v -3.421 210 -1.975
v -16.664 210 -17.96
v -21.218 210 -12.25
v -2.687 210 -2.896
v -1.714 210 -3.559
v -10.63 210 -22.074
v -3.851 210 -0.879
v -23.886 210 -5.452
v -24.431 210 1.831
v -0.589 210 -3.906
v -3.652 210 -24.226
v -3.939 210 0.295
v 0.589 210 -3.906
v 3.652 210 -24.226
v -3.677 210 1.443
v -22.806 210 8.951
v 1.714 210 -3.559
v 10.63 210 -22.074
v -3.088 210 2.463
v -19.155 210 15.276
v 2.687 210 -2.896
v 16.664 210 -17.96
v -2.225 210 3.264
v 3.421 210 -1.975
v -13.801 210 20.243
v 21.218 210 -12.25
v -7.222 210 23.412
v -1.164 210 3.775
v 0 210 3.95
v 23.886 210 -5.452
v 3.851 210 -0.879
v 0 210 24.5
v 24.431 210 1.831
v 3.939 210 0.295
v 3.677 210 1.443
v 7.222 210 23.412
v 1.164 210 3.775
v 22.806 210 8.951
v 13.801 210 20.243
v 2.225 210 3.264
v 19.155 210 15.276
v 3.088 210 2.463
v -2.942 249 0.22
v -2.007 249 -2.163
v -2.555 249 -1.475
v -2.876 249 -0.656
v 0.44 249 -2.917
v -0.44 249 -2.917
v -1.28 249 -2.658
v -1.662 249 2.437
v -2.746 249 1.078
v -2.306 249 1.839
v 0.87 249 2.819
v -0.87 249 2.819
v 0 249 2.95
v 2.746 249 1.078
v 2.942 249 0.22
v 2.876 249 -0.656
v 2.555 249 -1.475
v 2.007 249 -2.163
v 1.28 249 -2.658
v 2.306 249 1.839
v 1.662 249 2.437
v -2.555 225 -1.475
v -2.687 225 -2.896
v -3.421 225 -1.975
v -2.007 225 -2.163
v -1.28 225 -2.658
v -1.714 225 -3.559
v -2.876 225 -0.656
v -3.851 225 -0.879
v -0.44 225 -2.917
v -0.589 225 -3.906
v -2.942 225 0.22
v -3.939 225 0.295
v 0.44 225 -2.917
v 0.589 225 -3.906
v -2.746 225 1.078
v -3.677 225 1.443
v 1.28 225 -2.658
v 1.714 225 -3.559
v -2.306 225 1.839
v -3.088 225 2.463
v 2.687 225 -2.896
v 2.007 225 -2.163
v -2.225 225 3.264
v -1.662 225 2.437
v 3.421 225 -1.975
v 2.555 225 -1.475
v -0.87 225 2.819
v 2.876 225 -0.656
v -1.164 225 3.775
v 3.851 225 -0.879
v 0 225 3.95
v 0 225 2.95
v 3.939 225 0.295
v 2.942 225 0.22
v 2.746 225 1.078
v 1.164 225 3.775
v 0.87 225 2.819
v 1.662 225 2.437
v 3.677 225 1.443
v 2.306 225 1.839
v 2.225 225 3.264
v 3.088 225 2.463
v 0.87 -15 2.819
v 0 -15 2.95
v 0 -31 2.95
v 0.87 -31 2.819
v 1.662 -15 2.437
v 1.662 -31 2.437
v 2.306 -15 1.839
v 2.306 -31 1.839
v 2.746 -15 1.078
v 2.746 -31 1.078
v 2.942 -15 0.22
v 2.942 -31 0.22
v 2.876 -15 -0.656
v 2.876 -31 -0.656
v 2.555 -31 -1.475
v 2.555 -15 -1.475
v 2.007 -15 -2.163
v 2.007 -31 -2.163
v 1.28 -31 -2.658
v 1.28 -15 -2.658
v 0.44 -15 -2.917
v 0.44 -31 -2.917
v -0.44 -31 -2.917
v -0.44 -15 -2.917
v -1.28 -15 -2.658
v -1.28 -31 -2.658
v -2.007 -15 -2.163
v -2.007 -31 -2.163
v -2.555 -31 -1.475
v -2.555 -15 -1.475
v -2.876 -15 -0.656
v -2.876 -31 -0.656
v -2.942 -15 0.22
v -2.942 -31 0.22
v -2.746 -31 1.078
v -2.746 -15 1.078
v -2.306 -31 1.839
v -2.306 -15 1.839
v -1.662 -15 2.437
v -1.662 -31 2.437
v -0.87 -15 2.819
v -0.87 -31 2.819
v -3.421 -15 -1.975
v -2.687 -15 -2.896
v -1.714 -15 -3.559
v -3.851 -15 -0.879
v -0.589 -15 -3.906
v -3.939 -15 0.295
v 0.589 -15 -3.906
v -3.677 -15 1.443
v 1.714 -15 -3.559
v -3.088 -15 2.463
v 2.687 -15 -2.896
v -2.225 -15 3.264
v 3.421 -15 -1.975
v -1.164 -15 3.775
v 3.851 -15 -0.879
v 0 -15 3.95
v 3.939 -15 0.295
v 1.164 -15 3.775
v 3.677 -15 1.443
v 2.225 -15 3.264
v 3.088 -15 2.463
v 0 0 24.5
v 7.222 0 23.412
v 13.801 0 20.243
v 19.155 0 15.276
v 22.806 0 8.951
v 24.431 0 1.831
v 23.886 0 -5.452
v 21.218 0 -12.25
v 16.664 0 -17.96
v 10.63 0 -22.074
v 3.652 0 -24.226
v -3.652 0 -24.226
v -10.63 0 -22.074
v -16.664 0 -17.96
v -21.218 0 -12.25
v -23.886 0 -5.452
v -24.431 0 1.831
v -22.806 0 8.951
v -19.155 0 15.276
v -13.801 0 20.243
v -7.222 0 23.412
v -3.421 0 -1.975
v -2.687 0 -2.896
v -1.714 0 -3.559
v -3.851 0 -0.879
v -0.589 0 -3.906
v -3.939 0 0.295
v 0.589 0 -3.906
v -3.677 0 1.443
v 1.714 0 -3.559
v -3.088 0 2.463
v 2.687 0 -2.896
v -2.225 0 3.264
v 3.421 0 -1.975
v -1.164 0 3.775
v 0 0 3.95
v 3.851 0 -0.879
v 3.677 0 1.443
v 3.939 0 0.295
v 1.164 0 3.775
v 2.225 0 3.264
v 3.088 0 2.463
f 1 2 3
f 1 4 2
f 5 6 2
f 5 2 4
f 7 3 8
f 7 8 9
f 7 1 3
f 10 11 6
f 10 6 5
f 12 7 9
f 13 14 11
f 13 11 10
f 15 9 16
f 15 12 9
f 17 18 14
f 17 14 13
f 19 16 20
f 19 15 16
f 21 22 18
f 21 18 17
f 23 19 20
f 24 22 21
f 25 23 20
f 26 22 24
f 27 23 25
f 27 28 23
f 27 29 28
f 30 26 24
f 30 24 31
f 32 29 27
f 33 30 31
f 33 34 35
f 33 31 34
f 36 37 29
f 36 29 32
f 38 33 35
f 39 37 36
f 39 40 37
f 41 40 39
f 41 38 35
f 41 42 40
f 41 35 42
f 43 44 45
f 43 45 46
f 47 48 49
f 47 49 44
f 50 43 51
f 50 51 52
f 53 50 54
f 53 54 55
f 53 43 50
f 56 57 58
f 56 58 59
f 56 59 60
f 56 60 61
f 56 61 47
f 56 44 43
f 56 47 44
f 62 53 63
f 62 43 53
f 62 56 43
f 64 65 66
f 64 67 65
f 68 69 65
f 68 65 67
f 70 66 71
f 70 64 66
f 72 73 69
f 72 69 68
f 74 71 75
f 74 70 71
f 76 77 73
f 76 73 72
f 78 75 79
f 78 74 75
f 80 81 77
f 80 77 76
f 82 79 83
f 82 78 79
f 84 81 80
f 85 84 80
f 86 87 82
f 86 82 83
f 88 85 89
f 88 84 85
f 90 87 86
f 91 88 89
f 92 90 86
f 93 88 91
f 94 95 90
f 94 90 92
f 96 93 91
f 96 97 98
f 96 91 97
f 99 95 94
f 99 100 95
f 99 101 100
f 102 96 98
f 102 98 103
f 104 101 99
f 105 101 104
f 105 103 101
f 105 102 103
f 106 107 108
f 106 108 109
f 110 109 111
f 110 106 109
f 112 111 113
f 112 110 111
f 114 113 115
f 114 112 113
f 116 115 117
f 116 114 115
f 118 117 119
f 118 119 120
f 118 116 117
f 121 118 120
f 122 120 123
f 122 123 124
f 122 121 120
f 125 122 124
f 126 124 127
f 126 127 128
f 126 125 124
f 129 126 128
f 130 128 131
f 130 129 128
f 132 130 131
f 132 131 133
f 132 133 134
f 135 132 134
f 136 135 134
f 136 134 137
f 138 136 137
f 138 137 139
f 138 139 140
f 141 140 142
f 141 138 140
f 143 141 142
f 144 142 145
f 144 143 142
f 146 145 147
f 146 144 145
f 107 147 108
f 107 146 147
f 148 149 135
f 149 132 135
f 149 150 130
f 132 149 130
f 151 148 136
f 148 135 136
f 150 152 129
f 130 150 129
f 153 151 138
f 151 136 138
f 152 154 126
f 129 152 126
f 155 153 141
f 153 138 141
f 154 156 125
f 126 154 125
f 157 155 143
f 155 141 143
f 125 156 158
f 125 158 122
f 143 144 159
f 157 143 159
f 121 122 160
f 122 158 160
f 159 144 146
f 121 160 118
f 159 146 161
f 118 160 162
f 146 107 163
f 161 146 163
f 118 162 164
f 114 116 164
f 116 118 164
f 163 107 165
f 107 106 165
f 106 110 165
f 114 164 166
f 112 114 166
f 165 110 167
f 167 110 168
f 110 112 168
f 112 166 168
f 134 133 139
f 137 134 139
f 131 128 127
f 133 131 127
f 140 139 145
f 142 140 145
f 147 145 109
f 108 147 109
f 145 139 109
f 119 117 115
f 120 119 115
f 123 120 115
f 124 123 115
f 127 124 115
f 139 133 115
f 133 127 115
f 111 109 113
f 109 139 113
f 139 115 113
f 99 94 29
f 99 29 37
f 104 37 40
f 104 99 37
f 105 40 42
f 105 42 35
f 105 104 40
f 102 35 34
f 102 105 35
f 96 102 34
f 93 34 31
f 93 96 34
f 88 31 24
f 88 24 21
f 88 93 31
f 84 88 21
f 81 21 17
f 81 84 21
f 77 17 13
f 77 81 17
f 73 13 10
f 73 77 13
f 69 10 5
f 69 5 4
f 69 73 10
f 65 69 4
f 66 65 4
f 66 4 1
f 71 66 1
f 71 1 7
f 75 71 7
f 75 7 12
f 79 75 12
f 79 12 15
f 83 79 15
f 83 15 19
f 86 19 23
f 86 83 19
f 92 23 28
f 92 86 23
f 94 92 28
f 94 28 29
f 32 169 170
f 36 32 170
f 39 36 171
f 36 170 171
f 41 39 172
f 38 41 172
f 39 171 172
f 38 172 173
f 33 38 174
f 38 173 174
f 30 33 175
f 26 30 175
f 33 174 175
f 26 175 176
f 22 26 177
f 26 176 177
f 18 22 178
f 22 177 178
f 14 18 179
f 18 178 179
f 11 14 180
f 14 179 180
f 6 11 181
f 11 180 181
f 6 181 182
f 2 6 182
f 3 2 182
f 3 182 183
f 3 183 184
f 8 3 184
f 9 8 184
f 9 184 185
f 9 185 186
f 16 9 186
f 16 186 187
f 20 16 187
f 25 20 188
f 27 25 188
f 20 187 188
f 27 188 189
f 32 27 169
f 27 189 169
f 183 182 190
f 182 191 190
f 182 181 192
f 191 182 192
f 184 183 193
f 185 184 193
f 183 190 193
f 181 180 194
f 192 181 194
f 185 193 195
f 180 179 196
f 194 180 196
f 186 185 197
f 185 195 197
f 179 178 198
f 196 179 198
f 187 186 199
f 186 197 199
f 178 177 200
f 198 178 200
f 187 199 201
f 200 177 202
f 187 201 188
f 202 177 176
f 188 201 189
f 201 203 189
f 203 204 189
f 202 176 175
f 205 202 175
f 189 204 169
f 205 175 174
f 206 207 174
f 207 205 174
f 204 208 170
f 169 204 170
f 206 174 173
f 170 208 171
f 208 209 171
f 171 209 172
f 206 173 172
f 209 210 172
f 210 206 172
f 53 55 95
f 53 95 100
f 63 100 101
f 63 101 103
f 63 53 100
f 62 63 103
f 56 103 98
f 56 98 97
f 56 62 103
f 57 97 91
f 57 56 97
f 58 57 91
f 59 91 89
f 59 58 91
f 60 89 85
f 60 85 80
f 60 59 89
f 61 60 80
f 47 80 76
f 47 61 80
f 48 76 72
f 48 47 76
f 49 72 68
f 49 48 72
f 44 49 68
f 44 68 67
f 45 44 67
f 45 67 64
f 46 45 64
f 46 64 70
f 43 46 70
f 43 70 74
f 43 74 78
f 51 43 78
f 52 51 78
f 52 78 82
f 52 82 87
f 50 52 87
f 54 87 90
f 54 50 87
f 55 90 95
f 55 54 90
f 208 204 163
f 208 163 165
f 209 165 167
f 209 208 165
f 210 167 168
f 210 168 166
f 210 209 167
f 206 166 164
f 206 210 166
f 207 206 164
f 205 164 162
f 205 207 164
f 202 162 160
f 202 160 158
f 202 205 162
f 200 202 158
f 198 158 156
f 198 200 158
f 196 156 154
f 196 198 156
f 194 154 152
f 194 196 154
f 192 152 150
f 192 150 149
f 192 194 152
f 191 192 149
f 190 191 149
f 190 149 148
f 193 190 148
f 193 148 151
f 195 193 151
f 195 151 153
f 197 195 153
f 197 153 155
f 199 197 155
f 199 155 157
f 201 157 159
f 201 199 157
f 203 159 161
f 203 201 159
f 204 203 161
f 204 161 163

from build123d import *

# Parameters (mm, degrees)
SKETCH1_R            = 24.5
BOSS_EXTRUDE8_DEPTH  = 210
SKETCH1_9_R          = 3.95
BOSS_EXTRUDE9_DEPTH  = 15
BOSS_EXTRUDE10_START = -15
SKETCH1_10_R         = 2.95
BOSS_EXTRUDE10_DEPTH = 16
BOSS_EXTRUDE11_START = 225
SKETCH1_11_R         = 3.95
BOSS_EXTRUDE11_DEPTH = 15
BOSS_EXTRUDE12_START = 24
SKETCH2_R            = 2.95
BOSS_EXTRUDE12_DEPTH = 24


with BuildPart() as part:
    # Sketch1 → Boss-Extrude8 (new body)
    with BuildSketch(Plane(origin=(0, 0, 0), x_dir=(1, 0, 0), z_dir=(0, 1, 0))):
        with Locations(Location((0, 0, 0), (0, 0, 270))):
            Circle(SKETCH1_R)
    extrude(amount=BOSS_EXTRUDE8_DEPTH)

    # Sketch1<9> → Boss-Extrude9 (add)
    with BuildSketch(Plane(origin=(0, 0, 0), x_dir=(1, 0, 0), z_dir=(0, 1, 0))):
        with Locations(Location((0, 0, 0), (0, 0, 270))):
            Circle(SKETCH1_9_R)
    extrude(amount=-BOSS_EXTRUDE9_DEPTH)

    # Sketch1<10> → Boss-Extrude10 (add)
    with BuildSketch(Plane(origin=(0, 0, 0), x_dir=(1, 0, 0), z_dir=(0, 1, 0)).offset(BOSS_EXTRUDE10_START)):
        with Locations(Location((0, 0, 0), (0, 0, 270))):
            Circle(SKETCH1_10_R)
    extrude(amount=-BOSS_EXTRUDE10_DEPTH)

    # Sketch1<11> → Boss-Extrude11 (add)
    with BuildSketch(Plane(origin=(0, 0, 0), x_dir=(1, 0, 0), z_dir=(0, 1, 0)).offset(BOSS_EXTRUDE11_START)):
        with Locations(Location((0, 0, 0), (0, 0, 270))):
            Circle(SKETCH1_11_R)
    extrude(amount=-BOSS_EXTRUDE11_DEPTH)

    # Sketch2 → Boss-Extrude12 (add)
    with BuildSketch(Plane(origin=(0, 225, 0), x_dir=(1, 0, 0), z_dir=(0, 1, 0)).offset(BOSS_EXTRUDE12_START)):
        with Locations(Location((0, 0, 0), (0, 0, 270))):
            Circle(SKETCH2_R)
    extrude(amount=-BOSS_EXTRUDE12_DEPTH)


solid = part.part
